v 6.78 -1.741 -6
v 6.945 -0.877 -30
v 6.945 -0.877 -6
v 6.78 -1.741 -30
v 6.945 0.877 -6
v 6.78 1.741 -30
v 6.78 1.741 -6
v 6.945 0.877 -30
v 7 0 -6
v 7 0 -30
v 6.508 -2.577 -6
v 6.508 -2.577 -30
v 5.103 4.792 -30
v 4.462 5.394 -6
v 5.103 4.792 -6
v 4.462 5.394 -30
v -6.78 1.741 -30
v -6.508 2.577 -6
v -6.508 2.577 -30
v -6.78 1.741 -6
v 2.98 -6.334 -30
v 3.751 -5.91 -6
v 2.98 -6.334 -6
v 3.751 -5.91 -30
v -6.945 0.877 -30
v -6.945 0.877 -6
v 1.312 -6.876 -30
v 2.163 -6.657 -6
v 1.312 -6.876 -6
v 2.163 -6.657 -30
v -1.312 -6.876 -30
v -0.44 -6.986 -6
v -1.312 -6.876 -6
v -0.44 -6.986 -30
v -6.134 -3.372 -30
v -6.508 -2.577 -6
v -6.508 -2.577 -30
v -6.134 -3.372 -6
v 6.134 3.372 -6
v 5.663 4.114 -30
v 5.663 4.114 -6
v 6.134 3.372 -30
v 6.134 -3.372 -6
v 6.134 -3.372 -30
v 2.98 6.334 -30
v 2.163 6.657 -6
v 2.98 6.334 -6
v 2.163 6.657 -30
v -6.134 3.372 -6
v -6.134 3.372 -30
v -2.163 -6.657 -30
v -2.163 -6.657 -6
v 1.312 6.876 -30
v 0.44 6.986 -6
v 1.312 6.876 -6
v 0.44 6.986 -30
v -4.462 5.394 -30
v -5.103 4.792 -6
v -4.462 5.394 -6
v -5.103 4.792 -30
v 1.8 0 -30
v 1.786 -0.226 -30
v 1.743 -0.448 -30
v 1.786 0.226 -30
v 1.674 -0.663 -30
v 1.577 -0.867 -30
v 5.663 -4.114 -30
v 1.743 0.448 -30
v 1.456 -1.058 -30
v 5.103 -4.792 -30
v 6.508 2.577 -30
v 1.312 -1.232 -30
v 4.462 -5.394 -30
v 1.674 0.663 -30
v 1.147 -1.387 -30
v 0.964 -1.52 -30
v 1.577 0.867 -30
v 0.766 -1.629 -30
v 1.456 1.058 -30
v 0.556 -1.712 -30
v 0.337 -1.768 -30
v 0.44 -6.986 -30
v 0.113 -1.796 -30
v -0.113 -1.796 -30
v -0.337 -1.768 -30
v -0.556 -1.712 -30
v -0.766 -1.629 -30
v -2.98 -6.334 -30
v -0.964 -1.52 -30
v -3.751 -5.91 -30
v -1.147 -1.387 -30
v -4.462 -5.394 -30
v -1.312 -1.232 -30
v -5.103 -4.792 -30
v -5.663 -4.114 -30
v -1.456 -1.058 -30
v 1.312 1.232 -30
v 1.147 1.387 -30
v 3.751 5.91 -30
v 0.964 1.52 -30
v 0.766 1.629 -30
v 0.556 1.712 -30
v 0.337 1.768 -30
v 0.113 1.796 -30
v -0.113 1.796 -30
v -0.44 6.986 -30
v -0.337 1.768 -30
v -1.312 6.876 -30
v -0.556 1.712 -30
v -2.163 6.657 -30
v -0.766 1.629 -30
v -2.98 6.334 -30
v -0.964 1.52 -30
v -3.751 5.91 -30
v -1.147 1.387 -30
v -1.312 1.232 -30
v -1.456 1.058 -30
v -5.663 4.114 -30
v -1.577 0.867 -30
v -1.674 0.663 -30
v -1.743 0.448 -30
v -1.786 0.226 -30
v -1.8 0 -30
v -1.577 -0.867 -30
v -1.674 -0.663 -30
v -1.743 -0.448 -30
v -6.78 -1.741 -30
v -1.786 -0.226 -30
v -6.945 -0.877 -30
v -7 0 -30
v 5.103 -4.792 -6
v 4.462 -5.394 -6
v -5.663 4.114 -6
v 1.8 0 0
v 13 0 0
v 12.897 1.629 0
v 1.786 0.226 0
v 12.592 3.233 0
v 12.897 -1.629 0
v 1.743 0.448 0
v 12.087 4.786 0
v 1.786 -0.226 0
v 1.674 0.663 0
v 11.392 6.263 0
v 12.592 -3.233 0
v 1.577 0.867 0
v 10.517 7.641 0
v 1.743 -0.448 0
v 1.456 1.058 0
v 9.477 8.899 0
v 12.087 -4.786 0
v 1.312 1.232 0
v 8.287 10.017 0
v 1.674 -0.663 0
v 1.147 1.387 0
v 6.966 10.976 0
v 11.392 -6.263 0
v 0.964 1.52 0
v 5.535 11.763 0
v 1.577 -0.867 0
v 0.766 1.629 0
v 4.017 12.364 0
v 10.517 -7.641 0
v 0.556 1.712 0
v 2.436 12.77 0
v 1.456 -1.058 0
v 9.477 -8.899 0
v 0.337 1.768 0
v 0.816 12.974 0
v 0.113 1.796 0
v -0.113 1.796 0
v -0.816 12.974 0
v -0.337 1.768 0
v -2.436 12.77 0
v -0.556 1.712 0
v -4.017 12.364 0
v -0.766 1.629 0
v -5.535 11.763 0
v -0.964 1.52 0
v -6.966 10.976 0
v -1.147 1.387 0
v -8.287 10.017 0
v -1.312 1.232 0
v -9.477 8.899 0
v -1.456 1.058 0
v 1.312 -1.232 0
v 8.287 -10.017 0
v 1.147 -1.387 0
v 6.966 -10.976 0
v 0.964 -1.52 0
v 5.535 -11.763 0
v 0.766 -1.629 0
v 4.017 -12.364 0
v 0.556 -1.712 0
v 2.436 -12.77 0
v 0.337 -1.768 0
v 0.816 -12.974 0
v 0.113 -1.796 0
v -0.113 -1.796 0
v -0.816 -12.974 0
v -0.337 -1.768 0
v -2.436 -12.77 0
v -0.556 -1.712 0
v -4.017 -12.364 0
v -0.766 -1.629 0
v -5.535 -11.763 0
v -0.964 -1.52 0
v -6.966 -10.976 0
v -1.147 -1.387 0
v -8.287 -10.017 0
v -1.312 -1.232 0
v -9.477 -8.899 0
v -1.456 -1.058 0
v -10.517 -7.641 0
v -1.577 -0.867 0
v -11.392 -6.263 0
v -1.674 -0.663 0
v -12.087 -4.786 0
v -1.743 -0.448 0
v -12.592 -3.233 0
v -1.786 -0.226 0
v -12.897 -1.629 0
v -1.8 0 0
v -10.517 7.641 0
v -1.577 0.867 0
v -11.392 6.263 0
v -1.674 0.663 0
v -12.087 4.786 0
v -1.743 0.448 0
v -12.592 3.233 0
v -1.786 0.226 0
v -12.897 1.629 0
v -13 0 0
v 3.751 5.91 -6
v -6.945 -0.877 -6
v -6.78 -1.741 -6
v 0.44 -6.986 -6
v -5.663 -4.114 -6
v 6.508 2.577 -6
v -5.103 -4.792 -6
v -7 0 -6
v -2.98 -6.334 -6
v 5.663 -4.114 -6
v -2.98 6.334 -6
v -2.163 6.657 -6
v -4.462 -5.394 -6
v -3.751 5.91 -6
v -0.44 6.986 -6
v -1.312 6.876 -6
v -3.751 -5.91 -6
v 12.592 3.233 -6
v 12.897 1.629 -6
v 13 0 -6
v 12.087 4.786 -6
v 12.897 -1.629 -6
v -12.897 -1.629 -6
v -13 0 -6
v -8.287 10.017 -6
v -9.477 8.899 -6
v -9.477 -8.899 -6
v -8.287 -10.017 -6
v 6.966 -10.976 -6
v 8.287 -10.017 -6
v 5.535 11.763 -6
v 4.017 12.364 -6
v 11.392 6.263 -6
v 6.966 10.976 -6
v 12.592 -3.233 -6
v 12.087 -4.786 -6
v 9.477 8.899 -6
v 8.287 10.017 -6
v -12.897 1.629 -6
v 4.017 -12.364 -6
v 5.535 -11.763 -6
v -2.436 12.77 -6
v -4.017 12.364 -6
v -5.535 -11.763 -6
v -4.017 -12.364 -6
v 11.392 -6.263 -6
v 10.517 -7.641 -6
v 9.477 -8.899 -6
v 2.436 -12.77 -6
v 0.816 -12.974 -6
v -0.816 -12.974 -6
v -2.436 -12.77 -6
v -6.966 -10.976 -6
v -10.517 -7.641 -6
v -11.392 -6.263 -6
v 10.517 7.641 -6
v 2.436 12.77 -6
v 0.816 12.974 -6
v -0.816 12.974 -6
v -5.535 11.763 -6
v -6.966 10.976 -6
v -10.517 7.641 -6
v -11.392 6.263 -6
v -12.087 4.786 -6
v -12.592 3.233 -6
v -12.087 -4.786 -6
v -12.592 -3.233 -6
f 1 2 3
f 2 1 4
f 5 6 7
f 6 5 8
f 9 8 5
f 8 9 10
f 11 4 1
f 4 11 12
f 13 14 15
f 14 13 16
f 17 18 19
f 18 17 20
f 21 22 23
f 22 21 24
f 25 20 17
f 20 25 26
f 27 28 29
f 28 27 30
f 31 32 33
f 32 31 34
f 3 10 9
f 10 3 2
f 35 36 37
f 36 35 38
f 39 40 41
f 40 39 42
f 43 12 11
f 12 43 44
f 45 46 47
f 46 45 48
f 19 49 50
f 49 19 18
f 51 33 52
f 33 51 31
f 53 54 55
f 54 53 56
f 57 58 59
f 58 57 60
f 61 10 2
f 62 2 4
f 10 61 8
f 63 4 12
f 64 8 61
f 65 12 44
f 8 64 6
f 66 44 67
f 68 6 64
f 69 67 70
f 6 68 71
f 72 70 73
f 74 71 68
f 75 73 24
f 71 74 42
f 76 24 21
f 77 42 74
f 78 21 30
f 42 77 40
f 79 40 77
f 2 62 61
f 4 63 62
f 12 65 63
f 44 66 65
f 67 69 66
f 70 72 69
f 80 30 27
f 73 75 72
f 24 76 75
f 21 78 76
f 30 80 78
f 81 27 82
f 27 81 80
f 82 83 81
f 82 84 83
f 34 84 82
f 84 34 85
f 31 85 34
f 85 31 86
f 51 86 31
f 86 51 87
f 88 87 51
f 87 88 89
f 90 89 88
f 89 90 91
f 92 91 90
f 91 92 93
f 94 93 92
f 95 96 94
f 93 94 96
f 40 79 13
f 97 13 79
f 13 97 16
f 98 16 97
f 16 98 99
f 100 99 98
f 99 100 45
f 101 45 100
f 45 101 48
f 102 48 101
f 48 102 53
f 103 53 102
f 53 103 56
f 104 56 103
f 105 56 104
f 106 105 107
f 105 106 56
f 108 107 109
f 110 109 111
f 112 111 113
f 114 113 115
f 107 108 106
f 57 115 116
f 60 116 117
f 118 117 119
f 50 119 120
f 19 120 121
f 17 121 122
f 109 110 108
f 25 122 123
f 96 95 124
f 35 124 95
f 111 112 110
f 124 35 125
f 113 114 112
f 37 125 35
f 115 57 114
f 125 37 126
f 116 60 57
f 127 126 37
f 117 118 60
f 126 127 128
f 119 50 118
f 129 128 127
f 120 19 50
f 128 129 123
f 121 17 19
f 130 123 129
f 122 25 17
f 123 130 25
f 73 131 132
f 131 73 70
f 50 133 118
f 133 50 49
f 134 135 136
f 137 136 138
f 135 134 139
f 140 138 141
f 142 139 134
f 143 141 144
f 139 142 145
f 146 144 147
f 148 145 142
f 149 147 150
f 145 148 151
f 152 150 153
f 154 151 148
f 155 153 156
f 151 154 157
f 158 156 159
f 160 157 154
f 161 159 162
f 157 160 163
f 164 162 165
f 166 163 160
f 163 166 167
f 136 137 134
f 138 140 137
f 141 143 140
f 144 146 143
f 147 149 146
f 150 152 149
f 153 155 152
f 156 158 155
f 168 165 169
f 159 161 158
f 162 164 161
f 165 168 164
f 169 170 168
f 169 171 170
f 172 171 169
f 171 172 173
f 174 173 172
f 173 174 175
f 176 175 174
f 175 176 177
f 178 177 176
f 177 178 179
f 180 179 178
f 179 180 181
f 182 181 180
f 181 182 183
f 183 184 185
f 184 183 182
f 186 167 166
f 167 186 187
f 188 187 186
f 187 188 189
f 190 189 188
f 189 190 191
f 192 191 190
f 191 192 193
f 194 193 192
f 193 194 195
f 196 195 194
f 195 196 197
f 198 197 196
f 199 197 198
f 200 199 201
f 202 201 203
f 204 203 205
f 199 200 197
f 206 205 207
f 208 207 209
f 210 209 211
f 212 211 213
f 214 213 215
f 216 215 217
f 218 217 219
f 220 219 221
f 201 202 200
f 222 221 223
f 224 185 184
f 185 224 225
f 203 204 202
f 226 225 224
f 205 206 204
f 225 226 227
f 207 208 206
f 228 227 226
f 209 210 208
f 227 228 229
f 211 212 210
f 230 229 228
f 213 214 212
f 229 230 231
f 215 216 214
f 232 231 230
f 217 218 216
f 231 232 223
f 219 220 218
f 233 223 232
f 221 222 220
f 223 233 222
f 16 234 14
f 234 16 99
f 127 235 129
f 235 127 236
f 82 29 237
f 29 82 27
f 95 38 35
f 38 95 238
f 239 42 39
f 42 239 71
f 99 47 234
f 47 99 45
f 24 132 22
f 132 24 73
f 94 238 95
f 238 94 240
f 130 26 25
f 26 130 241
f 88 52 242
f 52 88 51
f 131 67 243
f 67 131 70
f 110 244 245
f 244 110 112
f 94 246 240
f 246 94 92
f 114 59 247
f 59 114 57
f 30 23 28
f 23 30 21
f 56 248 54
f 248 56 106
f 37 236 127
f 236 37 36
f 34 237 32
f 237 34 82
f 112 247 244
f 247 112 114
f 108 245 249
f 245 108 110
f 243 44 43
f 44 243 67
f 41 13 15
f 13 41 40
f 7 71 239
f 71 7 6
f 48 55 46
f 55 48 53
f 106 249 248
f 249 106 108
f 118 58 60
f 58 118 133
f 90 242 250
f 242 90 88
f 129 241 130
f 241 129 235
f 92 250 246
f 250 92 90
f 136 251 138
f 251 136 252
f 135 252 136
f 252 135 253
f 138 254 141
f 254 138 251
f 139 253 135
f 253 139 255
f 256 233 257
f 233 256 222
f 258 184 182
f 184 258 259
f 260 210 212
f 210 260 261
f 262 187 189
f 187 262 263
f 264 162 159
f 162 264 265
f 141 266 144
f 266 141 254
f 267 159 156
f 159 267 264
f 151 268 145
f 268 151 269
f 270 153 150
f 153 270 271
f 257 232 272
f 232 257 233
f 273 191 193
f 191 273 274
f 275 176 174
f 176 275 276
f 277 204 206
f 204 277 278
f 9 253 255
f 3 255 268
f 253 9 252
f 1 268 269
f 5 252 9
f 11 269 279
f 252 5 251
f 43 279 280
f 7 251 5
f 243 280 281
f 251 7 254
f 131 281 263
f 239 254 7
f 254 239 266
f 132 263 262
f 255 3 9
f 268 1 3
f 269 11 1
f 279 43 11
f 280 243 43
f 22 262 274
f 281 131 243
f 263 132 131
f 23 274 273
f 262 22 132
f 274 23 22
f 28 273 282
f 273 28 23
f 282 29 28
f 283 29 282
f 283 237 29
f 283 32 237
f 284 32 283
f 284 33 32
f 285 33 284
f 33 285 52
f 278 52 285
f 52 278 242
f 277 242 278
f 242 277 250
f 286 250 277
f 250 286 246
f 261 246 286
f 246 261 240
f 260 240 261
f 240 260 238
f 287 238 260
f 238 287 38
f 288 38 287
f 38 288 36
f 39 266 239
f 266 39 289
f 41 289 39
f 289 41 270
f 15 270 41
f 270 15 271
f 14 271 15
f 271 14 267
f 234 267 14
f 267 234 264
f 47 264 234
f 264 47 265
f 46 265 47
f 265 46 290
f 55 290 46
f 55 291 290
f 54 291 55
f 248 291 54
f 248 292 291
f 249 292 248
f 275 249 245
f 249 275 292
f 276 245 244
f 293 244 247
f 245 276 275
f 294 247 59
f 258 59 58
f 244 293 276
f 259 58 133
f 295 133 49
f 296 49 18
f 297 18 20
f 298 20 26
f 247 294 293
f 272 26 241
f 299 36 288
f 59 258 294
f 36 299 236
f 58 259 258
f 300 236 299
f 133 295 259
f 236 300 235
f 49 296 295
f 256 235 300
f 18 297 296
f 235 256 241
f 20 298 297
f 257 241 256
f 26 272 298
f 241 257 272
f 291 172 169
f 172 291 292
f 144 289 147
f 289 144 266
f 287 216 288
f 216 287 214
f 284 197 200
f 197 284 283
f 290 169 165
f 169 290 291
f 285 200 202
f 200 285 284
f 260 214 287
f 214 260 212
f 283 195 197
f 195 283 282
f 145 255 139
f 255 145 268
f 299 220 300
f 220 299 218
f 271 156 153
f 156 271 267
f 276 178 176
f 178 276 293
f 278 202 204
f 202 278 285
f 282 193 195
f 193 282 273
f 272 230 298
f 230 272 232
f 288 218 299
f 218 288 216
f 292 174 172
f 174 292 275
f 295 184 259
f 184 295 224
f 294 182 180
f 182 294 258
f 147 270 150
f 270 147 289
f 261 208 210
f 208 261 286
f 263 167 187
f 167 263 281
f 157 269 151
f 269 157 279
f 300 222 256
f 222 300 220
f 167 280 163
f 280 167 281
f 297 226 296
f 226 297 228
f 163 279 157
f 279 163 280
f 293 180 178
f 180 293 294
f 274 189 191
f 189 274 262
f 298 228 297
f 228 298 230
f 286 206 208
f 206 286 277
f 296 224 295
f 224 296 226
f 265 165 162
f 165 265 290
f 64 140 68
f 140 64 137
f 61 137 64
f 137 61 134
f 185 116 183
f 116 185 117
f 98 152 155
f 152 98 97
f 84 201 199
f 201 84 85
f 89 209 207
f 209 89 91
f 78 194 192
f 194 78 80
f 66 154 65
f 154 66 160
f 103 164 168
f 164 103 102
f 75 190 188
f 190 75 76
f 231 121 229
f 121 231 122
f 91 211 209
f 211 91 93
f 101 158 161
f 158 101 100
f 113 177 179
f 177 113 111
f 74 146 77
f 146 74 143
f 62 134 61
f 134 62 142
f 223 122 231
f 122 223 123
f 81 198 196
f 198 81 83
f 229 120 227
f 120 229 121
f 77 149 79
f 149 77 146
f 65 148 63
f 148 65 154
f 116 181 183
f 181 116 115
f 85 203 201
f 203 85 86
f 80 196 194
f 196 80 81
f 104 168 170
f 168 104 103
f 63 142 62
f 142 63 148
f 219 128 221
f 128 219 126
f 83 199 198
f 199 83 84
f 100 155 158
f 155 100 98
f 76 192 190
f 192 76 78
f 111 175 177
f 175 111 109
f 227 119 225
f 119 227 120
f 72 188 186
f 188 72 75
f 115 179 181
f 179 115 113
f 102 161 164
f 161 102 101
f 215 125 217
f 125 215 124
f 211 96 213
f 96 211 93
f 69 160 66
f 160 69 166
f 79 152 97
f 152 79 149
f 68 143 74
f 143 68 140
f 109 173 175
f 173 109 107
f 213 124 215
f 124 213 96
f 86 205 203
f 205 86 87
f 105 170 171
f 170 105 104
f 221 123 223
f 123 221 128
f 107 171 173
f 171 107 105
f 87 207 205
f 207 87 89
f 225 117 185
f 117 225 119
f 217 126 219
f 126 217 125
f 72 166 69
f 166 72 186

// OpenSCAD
$fn = 50;


difference() {
	union() {
		translate(v = [0, 0, -30.0000000000]) {
			cylinder(h = 30, r = 7.0000000000);
		}
		translate(v = [0, 0, -6.0000000000]) {
			cylinder(h = 6, r = 13.0000000000);
		}
	}
	union() {
		#translate(v = [0, 0, -30]) {
			cylinder(h = 30, r = 1.8000000000);
		}
	}
}
